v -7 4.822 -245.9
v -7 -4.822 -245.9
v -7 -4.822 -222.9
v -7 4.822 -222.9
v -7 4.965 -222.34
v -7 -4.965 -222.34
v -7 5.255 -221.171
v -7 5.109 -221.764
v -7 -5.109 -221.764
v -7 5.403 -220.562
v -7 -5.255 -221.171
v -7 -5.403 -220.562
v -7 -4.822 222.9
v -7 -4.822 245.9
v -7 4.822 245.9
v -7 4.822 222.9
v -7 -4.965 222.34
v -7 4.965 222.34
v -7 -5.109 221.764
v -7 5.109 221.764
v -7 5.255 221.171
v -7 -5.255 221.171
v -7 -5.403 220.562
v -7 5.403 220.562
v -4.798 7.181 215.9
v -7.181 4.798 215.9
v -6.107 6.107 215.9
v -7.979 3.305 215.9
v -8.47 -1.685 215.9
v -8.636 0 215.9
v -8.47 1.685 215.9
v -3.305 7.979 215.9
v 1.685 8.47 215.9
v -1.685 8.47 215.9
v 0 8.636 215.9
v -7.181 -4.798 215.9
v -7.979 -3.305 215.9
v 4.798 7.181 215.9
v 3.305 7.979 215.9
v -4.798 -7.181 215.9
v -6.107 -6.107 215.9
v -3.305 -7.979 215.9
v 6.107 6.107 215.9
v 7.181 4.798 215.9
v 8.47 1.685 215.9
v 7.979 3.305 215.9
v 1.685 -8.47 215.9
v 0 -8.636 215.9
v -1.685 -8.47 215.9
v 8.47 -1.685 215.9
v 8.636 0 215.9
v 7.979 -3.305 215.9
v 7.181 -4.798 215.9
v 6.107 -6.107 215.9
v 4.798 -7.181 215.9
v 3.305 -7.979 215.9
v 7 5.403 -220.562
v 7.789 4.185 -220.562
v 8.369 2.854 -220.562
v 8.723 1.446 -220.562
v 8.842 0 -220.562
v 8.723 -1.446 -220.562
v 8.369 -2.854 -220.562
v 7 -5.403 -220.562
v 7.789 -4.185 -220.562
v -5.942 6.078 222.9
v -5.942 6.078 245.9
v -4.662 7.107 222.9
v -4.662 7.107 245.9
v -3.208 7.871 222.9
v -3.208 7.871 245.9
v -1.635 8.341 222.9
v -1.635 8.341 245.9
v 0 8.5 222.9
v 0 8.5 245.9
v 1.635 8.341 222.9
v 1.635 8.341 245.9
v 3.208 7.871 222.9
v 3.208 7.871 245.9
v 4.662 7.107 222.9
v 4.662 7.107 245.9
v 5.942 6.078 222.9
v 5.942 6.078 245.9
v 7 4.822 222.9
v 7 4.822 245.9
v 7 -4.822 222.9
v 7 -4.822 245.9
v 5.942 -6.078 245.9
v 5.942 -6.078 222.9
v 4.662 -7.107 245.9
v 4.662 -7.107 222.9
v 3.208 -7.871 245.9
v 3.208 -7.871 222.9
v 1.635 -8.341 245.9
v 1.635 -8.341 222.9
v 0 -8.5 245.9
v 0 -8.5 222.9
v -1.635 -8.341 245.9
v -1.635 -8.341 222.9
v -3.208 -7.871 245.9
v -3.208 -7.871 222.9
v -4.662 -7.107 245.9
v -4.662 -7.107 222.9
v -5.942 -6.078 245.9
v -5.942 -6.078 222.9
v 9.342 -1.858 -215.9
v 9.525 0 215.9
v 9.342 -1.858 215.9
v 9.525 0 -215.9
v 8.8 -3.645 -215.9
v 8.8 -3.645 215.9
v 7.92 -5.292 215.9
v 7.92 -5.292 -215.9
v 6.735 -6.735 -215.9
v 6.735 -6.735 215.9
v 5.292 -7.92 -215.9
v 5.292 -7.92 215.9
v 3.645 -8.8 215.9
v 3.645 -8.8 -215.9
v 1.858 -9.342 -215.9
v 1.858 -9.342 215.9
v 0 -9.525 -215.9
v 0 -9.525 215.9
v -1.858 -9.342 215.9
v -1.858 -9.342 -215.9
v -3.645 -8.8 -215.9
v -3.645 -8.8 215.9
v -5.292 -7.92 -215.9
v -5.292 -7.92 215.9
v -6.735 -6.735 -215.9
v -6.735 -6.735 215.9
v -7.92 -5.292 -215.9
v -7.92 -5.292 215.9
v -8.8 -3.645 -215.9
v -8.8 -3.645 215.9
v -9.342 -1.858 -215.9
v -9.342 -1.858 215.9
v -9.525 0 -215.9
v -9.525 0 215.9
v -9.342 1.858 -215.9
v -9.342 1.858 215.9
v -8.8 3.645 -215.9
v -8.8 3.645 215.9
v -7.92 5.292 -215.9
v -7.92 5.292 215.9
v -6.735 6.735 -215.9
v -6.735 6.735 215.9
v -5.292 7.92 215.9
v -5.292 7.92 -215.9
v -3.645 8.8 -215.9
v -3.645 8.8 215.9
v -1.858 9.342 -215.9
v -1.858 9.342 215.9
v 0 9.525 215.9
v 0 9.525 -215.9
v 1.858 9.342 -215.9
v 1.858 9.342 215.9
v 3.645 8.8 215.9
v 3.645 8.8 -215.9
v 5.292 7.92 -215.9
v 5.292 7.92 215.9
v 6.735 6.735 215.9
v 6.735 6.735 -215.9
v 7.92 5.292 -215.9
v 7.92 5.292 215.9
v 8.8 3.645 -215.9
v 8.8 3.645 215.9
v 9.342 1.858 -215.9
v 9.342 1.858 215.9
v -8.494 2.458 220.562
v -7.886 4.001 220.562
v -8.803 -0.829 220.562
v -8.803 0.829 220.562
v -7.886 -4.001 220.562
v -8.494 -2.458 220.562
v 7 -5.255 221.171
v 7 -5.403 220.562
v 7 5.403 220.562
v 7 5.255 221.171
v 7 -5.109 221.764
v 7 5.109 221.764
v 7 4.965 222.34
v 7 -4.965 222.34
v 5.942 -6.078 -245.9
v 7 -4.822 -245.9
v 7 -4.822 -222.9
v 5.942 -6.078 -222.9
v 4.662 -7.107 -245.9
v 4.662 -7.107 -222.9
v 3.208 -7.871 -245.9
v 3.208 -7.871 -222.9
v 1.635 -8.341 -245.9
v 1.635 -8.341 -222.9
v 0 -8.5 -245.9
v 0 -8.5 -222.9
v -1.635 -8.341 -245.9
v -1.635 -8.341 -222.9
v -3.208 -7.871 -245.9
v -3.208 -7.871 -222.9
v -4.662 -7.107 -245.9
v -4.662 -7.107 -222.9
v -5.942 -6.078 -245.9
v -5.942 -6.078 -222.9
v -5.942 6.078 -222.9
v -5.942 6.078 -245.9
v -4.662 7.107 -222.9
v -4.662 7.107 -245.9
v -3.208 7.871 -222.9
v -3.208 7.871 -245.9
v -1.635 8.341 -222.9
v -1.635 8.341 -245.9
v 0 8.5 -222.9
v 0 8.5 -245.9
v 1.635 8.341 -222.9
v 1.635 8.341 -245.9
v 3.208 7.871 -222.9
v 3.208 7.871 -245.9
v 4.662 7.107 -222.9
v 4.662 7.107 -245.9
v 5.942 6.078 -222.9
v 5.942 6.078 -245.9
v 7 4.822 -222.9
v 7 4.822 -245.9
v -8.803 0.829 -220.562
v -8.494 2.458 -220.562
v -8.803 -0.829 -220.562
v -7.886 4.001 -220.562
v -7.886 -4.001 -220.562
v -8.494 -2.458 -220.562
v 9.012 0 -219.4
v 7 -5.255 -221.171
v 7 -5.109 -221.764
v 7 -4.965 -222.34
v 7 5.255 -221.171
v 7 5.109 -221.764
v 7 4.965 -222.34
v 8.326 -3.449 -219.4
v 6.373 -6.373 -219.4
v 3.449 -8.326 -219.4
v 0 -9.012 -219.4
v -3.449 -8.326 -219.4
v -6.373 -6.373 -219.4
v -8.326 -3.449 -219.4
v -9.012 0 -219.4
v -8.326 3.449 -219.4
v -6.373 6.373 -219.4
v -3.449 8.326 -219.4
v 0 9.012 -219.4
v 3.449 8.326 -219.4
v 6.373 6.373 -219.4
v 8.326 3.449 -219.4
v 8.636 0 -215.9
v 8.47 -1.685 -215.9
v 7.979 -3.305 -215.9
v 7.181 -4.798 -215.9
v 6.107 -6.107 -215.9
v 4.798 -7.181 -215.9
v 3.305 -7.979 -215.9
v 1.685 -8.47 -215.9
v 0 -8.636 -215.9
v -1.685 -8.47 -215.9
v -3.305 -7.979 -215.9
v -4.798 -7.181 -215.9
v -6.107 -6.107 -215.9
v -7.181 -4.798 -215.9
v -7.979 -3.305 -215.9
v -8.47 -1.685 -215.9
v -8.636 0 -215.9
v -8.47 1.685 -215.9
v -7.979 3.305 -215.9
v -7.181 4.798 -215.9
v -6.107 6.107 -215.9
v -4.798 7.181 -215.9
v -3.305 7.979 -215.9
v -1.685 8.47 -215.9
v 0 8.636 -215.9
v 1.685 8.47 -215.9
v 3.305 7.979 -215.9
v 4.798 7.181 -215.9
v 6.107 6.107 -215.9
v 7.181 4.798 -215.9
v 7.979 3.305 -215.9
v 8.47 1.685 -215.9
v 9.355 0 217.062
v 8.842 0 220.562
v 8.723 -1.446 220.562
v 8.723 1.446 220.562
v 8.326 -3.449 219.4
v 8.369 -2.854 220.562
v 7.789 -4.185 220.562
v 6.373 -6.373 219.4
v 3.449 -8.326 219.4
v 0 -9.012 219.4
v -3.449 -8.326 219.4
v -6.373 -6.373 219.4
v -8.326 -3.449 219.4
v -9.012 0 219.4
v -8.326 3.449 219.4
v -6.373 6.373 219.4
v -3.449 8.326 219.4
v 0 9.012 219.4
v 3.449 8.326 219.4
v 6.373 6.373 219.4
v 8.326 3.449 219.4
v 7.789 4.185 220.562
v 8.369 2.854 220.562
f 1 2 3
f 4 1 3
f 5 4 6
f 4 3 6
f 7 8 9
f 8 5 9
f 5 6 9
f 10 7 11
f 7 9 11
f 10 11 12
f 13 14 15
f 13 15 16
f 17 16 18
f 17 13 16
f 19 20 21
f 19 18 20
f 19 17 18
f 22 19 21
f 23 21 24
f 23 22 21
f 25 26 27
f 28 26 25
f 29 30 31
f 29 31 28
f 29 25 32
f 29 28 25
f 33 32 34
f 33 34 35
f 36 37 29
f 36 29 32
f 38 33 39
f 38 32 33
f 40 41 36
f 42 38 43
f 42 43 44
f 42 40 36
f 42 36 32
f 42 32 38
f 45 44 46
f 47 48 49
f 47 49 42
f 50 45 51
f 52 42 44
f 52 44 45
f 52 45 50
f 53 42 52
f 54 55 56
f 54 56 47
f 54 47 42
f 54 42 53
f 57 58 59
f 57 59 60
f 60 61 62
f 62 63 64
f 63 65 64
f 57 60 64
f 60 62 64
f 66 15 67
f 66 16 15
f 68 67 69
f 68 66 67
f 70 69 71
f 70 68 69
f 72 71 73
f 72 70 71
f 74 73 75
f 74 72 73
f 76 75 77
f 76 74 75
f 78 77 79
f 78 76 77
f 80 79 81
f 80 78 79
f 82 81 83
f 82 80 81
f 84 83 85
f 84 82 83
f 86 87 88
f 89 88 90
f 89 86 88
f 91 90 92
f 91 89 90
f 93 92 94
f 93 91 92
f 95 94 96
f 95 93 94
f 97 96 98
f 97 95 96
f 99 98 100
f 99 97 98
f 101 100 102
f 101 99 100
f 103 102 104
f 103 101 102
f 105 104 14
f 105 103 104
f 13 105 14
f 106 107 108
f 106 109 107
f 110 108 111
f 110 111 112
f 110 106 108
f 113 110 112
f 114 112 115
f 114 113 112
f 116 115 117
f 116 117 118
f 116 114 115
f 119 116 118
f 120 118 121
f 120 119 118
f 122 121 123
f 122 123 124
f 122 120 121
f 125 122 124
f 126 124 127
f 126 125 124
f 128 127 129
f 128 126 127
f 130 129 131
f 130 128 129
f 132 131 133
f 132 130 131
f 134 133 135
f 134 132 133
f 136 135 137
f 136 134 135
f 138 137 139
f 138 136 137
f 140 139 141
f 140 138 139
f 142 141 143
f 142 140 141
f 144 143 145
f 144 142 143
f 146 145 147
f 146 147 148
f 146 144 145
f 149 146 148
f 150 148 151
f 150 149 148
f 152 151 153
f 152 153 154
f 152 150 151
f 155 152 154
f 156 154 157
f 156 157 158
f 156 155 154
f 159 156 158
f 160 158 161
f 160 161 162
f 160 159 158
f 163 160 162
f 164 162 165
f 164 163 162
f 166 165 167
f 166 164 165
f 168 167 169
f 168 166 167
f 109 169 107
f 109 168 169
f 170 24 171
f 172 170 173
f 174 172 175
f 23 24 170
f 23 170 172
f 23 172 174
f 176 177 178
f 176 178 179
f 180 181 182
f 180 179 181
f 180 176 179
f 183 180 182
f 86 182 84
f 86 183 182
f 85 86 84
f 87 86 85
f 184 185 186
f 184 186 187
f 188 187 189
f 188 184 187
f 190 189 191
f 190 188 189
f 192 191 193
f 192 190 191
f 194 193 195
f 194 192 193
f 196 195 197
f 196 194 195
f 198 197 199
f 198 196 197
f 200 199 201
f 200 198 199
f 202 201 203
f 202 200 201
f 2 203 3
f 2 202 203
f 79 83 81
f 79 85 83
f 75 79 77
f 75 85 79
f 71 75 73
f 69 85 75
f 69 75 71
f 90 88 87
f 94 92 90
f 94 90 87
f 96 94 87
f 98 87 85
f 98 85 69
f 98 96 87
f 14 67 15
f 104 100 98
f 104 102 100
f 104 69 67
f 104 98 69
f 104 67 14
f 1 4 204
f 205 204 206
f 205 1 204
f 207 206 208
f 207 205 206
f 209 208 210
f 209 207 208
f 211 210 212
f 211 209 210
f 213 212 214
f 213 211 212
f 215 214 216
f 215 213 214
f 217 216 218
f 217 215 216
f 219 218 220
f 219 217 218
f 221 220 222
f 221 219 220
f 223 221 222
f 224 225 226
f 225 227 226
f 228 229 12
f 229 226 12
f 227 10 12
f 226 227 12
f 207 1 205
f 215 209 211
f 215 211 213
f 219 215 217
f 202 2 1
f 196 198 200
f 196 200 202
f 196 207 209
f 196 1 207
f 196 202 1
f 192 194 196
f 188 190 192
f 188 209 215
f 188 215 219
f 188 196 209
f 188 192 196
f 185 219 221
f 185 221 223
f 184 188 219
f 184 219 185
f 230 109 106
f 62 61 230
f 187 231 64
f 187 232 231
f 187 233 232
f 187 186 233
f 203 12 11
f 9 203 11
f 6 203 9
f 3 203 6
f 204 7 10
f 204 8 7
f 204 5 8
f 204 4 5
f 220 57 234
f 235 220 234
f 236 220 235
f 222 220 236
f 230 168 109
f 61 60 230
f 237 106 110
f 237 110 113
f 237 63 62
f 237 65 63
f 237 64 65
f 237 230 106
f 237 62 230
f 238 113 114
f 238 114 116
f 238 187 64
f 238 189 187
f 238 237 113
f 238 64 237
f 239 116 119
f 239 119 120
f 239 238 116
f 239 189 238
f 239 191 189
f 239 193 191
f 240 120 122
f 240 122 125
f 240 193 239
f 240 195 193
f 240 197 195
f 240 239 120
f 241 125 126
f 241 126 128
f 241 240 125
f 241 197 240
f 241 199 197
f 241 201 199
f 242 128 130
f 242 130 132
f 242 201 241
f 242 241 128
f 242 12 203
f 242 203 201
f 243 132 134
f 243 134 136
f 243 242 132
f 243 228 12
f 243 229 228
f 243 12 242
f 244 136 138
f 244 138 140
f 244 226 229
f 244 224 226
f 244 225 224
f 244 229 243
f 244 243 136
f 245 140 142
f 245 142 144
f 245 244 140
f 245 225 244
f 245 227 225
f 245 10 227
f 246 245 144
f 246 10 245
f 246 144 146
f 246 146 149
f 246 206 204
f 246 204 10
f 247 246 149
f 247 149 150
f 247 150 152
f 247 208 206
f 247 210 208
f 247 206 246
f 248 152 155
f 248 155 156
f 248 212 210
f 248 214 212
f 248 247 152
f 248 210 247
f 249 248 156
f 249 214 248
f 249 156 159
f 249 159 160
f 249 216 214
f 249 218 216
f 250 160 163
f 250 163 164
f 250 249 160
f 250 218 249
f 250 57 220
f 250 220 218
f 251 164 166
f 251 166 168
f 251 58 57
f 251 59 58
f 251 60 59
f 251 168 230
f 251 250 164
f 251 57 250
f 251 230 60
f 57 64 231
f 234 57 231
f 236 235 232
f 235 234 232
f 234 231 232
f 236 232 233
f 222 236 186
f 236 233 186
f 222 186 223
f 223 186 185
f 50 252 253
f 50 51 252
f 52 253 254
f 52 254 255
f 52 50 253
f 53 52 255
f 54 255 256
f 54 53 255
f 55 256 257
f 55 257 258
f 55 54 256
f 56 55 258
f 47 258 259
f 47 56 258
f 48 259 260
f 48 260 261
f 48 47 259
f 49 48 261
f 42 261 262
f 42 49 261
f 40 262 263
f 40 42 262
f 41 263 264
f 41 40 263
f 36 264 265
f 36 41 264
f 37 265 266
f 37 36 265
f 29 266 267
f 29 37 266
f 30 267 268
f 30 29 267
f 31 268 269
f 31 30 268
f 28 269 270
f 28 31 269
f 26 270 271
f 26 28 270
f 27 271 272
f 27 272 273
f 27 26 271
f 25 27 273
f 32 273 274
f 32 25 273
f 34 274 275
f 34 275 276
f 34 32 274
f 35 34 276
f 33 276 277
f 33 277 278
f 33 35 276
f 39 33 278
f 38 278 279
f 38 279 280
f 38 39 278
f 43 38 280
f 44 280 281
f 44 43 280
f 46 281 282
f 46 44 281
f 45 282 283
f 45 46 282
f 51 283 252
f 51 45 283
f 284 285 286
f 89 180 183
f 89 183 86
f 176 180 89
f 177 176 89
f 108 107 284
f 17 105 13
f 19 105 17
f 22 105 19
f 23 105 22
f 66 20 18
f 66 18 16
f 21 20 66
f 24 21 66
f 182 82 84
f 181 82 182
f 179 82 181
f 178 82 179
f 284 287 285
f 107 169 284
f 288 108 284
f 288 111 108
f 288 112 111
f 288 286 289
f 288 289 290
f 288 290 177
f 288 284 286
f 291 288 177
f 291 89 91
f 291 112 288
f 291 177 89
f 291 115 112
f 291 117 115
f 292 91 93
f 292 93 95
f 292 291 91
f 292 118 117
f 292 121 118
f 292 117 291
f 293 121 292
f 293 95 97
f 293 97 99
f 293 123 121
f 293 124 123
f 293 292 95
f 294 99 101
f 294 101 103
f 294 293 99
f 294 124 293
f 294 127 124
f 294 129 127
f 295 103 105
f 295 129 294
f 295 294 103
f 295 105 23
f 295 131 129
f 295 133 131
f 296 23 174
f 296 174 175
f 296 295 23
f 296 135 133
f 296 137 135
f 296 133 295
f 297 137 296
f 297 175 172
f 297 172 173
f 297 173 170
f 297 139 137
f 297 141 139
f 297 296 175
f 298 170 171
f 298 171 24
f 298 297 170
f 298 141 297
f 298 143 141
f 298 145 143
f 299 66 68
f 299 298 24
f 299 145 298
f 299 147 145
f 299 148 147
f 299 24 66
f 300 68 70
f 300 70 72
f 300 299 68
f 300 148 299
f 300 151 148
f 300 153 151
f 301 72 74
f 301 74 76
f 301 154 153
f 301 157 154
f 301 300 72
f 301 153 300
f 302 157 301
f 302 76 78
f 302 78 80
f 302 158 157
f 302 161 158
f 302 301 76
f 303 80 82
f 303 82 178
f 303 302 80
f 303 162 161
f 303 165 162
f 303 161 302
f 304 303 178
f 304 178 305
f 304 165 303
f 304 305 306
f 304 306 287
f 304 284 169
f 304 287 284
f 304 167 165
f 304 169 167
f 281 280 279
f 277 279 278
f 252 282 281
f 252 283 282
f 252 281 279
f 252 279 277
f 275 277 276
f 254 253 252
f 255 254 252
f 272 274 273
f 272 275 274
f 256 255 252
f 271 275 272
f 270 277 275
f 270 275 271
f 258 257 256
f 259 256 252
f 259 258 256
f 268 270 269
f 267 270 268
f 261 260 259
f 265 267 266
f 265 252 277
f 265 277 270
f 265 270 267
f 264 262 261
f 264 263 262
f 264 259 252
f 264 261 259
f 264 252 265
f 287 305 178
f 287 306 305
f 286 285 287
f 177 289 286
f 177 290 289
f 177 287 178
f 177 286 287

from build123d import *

# Parameters (mm, degrees)
CUT_EXTRUDE1_DEPTH      = 247.268676957
CUT_EXTRUDE1_DEPTH_BACK = 247.268676957


with BuildPart() as part:
    # Sketch2 → Revolve1 (revolve)
    with BuildSketch(Plane(origin=(0, 0, 0), x_dir=(0, 0, -1), z_dir=(1, 0, 0)), mode=Mode.PRIVATE) as revolve1_sk:
        Polygon((-215.9, 9.525), (215.9, 9.525), (222.9, 8.5), (245.9, 8.5), (245.9, 0), (215.9, 0), (215.9, 8.636), (-215.9, 8.636), (-215.9, 0), (-245.9, 0), (-245.9, 8.5), (-222.9, 8.5), align=None)
    revolve(revolve1_sk.sketch.rotate(Axis((0, 0, 215.9), (0, 0, -1)), 90), axis=Axis((0, 0, 215.9), (0, 0, -1)))

    # Sketch3 → Cut-Extrude1 (cut, two sides: drawn at the far end of the back side and taken through both)
    with BuildSketch(Plane(origin=(0, 0, 0), x_dir=(1, 0, 0), z_dir=(0, 1, 0)).offset(-CUT_EXTRUDE1_DEPTH_BACK)):
        Polygon((-7, -220.561998393), (-26.727444109, -220.561998393), (-26.727444109, -252.596471853), (37.522488539, -252.596471853), (37.522488539, -220.561998393), (7, -220.561998393), (7, -245.9), (-7, -245.9), align=None)
        Polygon((-7, 245.9), (-7, 220.561998393), (-26.727444109, 220.561998393), (-26.727444109, 252.596471853), (37.522488539, 252.596471853), (37.522488539, 220.561998393), (7, 220.561998393), (7, 245.9), align=None)
    extrude(amount=CUT_EXTRUDE1_DEPTH + CUT_EXTRUDE1_DEPTH_BACK, mode=Mode.SUBTRACT)


solid = part.part
